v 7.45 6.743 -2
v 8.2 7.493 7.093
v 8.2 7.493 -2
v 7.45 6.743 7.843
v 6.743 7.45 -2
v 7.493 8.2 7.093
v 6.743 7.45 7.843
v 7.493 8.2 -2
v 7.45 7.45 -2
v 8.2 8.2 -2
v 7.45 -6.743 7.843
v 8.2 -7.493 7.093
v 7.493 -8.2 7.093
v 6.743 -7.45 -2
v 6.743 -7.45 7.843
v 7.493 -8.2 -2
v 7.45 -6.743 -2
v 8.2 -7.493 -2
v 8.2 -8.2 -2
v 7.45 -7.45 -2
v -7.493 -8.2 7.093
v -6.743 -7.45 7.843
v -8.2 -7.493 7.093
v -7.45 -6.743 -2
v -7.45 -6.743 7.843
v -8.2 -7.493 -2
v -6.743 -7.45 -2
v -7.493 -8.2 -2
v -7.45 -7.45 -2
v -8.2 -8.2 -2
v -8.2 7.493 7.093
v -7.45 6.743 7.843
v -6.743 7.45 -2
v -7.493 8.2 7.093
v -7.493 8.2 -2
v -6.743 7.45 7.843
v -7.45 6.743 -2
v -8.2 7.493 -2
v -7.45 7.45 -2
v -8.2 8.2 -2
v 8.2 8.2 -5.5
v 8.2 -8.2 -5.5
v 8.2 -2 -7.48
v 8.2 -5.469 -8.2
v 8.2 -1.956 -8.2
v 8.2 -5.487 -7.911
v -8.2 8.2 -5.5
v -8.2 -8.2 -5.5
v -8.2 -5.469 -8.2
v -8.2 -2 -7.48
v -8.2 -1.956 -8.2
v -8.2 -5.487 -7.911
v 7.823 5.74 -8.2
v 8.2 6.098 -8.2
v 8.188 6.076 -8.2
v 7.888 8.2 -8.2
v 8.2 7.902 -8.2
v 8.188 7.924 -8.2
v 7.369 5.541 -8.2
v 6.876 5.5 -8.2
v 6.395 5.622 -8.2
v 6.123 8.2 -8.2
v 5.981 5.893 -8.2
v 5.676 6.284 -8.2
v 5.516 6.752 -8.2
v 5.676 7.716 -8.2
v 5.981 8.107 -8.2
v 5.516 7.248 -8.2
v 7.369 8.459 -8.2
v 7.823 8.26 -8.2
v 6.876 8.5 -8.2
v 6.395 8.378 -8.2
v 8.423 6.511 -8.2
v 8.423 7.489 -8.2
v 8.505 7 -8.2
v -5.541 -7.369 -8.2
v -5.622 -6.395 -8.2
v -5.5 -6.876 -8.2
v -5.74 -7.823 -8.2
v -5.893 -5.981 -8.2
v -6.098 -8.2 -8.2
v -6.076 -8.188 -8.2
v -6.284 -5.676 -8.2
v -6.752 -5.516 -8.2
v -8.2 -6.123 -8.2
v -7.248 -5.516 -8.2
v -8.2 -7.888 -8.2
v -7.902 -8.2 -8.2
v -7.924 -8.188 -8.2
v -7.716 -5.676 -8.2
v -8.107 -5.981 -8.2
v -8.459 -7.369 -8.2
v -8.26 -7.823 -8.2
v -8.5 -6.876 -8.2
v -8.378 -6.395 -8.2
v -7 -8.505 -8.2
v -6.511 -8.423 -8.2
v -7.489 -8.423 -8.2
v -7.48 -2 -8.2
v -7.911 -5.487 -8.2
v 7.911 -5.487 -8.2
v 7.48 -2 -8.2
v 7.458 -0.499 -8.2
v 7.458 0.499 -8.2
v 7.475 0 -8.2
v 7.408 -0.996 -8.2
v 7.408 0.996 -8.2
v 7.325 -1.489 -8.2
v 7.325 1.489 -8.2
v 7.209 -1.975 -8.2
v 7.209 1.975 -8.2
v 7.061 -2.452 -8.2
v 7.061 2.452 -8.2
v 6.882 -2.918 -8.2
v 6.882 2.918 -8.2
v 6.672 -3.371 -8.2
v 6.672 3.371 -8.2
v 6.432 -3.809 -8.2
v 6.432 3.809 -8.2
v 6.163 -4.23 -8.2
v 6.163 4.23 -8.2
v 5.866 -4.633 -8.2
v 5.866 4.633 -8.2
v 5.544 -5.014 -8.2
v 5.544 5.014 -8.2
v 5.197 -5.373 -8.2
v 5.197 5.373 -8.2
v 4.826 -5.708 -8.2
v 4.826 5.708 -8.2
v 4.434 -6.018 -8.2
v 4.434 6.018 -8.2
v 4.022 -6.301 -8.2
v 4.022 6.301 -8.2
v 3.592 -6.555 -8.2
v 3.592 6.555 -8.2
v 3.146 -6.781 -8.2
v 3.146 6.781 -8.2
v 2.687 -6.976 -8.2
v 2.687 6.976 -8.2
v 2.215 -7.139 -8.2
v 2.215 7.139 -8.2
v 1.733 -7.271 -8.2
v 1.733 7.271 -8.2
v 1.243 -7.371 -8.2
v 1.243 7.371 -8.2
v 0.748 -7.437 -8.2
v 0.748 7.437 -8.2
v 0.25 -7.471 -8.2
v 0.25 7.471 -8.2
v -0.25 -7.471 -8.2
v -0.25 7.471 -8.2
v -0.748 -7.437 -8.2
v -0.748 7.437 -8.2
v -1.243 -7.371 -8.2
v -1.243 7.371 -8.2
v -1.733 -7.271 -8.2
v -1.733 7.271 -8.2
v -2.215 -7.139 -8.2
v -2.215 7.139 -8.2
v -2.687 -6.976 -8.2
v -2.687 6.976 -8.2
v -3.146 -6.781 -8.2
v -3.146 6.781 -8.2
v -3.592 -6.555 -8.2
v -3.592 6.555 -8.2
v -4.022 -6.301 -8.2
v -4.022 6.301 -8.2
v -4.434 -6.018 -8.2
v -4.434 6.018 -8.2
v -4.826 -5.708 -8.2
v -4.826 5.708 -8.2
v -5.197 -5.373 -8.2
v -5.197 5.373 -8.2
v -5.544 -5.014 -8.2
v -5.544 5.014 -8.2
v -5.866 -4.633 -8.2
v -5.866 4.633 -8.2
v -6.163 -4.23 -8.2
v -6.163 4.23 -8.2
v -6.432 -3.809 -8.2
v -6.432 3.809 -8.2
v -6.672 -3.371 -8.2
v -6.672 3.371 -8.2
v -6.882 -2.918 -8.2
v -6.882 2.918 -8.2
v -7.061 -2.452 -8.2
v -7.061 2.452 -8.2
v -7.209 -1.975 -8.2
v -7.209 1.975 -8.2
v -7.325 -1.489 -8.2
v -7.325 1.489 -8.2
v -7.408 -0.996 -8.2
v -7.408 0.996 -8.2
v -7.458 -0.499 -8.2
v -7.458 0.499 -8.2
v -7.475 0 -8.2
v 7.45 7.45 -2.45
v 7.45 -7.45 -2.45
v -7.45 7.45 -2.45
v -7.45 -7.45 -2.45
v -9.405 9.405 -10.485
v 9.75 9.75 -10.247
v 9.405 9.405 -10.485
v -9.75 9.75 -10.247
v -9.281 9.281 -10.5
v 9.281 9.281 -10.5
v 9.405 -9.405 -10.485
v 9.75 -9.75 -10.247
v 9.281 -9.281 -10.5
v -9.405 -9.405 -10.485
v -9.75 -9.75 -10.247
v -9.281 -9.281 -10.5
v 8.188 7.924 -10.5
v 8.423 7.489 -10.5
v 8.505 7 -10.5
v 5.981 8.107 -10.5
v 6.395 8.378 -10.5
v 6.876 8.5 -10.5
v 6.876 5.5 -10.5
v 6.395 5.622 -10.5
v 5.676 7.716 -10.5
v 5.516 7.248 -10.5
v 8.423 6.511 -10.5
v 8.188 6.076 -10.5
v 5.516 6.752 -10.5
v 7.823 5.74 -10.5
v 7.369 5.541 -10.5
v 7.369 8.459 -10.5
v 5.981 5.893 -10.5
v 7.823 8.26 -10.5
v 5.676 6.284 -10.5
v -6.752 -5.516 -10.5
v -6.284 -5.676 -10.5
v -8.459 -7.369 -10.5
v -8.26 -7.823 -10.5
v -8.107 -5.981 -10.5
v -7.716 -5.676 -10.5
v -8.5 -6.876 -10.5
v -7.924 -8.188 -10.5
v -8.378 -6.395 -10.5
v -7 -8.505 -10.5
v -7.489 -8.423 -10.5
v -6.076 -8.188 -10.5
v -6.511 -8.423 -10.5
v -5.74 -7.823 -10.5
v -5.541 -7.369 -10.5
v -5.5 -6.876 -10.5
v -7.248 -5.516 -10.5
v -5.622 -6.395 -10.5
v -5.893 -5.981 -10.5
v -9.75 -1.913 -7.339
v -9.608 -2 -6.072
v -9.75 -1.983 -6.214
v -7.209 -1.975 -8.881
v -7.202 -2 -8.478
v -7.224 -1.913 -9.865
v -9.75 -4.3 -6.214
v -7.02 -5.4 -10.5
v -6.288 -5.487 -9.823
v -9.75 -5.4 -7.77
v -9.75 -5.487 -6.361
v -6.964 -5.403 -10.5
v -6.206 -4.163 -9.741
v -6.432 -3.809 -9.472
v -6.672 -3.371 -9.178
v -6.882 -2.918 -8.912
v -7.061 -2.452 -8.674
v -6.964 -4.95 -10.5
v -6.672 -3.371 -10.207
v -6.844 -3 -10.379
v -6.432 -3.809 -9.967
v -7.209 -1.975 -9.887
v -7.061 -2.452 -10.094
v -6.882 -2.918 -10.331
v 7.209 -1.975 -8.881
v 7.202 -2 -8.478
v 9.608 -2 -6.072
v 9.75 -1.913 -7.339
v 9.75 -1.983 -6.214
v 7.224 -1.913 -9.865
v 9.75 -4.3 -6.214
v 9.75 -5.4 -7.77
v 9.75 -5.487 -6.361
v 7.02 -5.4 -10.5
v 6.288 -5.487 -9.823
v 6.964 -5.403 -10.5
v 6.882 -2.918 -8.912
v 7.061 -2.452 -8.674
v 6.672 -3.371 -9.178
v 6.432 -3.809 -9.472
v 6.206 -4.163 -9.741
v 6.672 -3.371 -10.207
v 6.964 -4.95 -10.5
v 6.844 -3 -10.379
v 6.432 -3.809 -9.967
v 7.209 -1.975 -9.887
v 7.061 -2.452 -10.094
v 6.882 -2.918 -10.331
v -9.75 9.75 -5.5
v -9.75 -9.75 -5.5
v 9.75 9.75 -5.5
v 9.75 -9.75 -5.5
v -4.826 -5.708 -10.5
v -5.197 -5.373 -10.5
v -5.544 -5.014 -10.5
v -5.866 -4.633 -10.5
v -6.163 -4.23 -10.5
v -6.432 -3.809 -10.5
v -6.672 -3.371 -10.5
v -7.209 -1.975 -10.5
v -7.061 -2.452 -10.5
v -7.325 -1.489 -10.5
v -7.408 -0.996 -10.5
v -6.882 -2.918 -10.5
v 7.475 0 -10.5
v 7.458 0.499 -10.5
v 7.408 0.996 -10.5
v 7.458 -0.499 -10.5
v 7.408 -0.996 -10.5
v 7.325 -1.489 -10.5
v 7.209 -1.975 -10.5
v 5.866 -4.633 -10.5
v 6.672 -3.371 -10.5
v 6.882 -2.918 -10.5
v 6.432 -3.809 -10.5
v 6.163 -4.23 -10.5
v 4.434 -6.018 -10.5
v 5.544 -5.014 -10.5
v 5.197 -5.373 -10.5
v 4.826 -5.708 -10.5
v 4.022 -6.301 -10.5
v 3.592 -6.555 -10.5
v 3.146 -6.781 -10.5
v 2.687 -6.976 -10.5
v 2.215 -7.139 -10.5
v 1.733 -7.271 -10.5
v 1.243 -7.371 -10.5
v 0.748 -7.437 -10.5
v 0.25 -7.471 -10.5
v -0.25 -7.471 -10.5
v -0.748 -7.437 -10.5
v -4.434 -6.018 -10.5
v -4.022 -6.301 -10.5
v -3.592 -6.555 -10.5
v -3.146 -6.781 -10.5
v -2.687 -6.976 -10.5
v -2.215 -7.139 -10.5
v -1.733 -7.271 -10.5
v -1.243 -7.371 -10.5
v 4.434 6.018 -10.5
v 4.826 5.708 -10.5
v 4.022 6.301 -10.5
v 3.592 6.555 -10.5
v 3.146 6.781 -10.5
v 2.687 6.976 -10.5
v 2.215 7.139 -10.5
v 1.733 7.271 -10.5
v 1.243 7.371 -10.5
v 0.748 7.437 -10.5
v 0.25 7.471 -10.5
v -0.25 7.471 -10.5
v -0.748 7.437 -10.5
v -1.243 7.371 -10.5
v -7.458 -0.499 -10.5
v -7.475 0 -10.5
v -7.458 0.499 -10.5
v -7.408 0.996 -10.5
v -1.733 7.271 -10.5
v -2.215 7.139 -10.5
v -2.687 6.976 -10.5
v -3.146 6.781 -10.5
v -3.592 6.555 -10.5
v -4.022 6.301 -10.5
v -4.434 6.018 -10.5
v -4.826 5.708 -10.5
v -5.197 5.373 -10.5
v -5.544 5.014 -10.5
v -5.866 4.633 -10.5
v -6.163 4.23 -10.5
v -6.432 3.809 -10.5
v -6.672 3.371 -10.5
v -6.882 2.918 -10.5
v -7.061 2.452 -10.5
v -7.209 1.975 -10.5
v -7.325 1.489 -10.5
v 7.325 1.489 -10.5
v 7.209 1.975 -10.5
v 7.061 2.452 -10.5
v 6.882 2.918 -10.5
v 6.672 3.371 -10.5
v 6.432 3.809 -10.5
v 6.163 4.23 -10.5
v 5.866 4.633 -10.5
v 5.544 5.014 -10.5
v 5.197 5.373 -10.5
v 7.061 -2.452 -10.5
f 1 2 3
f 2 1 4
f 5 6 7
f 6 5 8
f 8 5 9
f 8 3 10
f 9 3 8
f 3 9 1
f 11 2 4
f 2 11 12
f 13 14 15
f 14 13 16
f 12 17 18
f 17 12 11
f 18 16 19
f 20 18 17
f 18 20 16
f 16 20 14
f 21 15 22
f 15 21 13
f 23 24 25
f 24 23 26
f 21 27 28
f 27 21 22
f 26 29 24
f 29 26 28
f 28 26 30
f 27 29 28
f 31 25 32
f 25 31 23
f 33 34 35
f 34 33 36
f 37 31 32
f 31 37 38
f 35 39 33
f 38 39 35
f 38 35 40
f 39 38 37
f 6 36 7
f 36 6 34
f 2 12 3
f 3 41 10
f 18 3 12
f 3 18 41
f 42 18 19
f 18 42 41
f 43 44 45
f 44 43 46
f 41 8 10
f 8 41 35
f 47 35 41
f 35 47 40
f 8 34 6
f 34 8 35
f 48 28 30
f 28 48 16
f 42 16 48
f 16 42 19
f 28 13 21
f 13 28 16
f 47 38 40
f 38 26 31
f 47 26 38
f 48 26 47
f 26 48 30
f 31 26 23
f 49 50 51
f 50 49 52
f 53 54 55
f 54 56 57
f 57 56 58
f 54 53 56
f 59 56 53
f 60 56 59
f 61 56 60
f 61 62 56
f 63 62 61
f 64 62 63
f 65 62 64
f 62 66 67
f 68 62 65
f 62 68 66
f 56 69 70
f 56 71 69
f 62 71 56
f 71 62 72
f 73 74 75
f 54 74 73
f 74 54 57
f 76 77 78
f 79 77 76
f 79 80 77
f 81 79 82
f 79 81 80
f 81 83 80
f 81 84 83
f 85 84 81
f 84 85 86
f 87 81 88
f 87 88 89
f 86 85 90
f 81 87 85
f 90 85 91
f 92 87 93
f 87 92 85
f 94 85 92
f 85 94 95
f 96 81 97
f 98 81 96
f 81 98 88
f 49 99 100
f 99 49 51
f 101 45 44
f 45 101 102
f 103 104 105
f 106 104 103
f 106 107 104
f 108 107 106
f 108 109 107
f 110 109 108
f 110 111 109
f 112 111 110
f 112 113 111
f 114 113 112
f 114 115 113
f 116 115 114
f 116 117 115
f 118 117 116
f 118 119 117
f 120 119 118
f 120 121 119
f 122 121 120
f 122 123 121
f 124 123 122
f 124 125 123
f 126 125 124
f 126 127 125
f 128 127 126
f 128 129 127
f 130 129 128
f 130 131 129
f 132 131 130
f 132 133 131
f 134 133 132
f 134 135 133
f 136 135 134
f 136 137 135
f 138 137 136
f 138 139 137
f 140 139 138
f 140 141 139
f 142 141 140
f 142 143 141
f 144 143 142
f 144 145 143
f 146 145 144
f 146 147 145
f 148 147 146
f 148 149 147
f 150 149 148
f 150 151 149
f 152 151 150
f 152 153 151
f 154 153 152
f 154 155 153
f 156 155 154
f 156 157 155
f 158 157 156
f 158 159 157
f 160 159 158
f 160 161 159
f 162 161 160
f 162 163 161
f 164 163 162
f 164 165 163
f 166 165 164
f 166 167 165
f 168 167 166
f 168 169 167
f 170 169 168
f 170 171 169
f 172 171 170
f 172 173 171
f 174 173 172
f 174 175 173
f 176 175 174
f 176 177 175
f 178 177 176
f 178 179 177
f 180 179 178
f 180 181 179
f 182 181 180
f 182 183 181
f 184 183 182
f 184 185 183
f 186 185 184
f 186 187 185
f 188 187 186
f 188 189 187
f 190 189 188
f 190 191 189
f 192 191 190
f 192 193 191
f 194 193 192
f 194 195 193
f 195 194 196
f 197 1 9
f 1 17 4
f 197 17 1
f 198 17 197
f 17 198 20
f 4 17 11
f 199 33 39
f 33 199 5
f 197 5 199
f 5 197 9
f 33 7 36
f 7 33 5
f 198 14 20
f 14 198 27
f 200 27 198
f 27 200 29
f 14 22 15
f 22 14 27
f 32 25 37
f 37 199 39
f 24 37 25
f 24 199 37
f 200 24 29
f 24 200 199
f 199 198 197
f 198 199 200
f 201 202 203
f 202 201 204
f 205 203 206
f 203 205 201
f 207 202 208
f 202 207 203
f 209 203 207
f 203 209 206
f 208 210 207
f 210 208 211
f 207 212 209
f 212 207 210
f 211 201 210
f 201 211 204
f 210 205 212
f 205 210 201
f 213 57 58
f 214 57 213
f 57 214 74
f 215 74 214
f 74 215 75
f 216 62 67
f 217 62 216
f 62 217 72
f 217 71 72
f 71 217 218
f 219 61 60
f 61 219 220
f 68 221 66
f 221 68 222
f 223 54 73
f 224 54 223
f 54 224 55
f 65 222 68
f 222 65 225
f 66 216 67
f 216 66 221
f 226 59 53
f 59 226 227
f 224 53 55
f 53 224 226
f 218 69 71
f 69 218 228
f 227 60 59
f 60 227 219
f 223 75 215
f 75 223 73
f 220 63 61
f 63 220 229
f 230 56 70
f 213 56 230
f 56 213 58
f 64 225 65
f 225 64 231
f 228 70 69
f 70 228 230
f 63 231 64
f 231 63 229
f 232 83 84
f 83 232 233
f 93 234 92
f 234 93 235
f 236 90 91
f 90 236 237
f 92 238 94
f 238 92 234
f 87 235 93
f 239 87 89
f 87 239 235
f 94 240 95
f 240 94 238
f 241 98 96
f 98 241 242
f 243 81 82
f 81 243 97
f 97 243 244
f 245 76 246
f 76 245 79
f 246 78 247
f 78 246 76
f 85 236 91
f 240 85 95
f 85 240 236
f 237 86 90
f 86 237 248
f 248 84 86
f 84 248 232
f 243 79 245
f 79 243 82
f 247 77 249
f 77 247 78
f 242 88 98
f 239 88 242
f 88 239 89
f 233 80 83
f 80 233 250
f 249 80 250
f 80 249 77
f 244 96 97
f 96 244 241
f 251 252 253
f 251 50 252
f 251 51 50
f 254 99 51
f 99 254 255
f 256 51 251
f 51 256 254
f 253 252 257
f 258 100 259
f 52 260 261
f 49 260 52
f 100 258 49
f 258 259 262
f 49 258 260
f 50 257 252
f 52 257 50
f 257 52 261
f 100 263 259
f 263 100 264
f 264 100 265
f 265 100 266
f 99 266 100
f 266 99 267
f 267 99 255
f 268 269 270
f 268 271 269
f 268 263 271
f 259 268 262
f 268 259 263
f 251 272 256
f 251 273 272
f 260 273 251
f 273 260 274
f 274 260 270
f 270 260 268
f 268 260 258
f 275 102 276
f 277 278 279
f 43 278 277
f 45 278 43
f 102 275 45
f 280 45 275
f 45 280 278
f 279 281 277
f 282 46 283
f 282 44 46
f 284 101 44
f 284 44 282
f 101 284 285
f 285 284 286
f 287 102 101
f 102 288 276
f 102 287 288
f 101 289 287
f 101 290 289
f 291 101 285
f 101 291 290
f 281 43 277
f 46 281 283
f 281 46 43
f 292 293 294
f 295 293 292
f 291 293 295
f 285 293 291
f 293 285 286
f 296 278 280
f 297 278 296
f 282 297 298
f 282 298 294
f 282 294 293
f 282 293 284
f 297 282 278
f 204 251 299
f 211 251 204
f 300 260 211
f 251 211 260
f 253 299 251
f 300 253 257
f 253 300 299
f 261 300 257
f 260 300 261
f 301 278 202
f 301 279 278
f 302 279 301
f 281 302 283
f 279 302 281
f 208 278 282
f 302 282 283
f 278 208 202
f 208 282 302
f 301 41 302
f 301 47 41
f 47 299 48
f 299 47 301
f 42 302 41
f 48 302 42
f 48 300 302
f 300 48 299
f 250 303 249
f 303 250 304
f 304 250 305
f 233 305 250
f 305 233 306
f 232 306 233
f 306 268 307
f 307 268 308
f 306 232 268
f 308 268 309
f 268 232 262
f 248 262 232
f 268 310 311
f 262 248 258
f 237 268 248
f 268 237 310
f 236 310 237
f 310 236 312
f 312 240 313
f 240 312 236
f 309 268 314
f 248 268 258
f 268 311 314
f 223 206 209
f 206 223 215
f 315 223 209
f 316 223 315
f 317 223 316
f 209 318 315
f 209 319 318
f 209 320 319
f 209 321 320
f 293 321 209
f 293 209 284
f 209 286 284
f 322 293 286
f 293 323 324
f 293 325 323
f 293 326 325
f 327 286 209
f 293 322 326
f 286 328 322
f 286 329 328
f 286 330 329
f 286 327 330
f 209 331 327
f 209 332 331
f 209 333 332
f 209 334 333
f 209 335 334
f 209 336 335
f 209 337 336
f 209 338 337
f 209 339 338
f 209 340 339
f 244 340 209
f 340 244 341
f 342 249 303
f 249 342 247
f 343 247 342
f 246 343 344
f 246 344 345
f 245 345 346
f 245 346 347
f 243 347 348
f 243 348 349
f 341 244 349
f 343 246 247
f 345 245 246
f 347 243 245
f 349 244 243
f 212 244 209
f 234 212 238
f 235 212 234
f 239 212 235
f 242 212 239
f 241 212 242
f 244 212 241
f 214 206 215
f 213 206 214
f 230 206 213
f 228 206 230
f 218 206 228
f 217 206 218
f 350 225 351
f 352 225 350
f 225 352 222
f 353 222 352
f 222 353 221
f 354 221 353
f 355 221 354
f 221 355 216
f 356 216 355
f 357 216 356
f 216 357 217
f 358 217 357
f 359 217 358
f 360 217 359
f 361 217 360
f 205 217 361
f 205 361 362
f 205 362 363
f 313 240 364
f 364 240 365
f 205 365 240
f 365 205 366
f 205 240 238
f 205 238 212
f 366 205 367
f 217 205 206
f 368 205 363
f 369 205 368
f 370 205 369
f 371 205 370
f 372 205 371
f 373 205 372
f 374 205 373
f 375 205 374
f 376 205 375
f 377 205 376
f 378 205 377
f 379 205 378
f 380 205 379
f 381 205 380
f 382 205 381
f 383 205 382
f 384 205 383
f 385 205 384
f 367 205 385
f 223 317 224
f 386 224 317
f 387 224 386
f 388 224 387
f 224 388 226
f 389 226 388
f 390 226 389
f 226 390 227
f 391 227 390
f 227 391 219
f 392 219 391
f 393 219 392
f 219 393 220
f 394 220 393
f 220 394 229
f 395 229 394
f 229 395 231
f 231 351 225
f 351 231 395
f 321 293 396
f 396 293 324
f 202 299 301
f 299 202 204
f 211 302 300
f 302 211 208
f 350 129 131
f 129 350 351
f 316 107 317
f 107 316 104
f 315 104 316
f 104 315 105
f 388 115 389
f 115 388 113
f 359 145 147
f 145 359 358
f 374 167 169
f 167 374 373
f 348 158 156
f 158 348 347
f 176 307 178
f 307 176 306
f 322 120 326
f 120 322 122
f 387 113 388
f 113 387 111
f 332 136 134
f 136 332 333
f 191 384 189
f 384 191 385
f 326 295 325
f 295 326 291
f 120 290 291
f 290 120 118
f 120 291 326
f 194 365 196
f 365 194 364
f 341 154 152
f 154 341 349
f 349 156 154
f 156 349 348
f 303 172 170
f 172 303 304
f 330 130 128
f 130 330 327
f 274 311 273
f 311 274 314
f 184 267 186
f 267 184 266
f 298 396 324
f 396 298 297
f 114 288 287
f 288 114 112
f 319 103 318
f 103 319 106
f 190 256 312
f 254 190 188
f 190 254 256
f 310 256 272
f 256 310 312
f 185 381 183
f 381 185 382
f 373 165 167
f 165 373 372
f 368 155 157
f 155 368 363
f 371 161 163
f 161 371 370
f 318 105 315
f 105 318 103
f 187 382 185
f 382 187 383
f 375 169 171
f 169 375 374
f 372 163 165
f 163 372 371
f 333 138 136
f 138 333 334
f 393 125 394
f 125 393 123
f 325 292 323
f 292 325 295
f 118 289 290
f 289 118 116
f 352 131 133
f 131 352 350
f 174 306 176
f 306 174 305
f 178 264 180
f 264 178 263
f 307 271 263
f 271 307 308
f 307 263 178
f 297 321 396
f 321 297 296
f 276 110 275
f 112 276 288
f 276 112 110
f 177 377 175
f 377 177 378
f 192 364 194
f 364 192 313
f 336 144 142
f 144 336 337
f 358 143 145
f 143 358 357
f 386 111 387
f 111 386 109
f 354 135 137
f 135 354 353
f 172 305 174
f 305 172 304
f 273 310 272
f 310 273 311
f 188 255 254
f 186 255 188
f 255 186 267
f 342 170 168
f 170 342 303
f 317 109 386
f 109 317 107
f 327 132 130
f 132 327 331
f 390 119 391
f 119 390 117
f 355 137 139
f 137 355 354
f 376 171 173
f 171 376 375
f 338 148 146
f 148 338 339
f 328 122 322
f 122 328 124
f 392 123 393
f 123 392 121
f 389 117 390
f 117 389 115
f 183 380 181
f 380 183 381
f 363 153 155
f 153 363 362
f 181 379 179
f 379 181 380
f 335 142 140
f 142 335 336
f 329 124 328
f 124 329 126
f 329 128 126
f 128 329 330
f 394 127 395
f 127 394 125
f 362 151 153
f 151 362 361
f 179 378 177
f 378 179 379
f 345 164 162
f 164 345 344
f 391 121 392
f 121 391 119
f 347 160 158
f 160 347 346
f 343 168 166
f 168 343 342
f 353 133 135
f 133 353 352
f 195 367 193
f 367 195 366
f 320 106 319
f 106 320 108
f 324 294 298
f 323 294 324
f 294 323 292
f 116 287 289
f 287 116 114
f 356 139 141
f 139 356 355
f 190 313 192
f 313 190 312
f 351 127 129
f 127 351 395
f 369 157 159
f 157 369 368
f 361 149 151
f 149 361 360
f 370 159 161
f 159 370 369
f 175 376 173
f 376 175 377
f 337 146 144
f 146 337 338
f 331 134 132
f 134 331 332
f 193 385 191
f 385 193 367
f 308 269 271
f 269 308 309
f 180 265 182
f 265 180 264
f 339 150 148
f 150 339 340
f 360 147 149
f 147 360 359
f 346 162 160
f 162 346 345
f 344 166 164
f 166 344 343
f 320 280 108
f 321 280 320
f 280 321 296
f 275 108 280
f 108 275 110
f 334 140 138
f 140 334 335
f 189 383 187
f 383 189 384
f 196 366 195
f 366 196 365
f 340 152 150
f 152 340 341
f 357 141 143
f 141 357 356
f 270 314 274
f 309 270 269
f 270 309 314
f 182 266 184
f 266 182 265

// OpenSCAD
use <MCAD/triangles.scad>
use <MCAD/boxes.scad>

$fa=0.01;
$fs=0.5;

module magnet() {
	color("gold")
	cylinder(r=7.475, h=3.95, center=true);
}

module roundedEdge() {
	difference() {
		translate([0,0.5,0.5])
		cube([20,1,1],center=true);
		rotate([0,90,0]) 
		cylinder(r=1,h=20,center=true);
	}
}

module roundEdges() {
	for(i=[0:3]) {
		rotate([0,i*90,0]) {
			translate([0,9.55,9.05])
			roundedEdge();
		}
	}
}

module tapering() {
	for(i=[1:4]) {
		rotate([0,i*90,0]) {
			translate([-7.5,-8,7.5])
			rotate([0,45,0])
			cube([2,20,1],center=true);

			translate([0,-8,8])
			rotate([45,0,0])
			cube([15,2,1],center=true);
			
			
		}
	}
}

module pin() {
	translate([7,10.2,7])
	rotate([90,0,0])
	cylinder(r=1.505,h=4,center=true);
}


module pins() {
	pin();
	mirror([1,0,1])
	pin();
}


module bevel() {
	translate([8.3,8.3,-3.7])
	rotate([0,-5,45])
	color("red")
	cube([1,5,3.5],center=true);
}

module bevels() {
	for(i=[1:4]) {
		rotate([0,0,i*90])
		bevel();
	}
}


//bevels();

module connector() {

	difference() {
		cube(16.4,center=true);
		translate([0,-5,0])
		cube(14.9,center=true);	
		tapering();
	}		

	difference() {
		translate([0,8,0])
		rotate([90,0,0])
		cube([19.5,19.5,5],center=true);

		roundEdges();

		translate([0,8.53,0])
		rotate([90,0,0]) {
		magnet();}
		
		pins();
		bevels();

	}
}


rotate([270,0,0])
connector();
